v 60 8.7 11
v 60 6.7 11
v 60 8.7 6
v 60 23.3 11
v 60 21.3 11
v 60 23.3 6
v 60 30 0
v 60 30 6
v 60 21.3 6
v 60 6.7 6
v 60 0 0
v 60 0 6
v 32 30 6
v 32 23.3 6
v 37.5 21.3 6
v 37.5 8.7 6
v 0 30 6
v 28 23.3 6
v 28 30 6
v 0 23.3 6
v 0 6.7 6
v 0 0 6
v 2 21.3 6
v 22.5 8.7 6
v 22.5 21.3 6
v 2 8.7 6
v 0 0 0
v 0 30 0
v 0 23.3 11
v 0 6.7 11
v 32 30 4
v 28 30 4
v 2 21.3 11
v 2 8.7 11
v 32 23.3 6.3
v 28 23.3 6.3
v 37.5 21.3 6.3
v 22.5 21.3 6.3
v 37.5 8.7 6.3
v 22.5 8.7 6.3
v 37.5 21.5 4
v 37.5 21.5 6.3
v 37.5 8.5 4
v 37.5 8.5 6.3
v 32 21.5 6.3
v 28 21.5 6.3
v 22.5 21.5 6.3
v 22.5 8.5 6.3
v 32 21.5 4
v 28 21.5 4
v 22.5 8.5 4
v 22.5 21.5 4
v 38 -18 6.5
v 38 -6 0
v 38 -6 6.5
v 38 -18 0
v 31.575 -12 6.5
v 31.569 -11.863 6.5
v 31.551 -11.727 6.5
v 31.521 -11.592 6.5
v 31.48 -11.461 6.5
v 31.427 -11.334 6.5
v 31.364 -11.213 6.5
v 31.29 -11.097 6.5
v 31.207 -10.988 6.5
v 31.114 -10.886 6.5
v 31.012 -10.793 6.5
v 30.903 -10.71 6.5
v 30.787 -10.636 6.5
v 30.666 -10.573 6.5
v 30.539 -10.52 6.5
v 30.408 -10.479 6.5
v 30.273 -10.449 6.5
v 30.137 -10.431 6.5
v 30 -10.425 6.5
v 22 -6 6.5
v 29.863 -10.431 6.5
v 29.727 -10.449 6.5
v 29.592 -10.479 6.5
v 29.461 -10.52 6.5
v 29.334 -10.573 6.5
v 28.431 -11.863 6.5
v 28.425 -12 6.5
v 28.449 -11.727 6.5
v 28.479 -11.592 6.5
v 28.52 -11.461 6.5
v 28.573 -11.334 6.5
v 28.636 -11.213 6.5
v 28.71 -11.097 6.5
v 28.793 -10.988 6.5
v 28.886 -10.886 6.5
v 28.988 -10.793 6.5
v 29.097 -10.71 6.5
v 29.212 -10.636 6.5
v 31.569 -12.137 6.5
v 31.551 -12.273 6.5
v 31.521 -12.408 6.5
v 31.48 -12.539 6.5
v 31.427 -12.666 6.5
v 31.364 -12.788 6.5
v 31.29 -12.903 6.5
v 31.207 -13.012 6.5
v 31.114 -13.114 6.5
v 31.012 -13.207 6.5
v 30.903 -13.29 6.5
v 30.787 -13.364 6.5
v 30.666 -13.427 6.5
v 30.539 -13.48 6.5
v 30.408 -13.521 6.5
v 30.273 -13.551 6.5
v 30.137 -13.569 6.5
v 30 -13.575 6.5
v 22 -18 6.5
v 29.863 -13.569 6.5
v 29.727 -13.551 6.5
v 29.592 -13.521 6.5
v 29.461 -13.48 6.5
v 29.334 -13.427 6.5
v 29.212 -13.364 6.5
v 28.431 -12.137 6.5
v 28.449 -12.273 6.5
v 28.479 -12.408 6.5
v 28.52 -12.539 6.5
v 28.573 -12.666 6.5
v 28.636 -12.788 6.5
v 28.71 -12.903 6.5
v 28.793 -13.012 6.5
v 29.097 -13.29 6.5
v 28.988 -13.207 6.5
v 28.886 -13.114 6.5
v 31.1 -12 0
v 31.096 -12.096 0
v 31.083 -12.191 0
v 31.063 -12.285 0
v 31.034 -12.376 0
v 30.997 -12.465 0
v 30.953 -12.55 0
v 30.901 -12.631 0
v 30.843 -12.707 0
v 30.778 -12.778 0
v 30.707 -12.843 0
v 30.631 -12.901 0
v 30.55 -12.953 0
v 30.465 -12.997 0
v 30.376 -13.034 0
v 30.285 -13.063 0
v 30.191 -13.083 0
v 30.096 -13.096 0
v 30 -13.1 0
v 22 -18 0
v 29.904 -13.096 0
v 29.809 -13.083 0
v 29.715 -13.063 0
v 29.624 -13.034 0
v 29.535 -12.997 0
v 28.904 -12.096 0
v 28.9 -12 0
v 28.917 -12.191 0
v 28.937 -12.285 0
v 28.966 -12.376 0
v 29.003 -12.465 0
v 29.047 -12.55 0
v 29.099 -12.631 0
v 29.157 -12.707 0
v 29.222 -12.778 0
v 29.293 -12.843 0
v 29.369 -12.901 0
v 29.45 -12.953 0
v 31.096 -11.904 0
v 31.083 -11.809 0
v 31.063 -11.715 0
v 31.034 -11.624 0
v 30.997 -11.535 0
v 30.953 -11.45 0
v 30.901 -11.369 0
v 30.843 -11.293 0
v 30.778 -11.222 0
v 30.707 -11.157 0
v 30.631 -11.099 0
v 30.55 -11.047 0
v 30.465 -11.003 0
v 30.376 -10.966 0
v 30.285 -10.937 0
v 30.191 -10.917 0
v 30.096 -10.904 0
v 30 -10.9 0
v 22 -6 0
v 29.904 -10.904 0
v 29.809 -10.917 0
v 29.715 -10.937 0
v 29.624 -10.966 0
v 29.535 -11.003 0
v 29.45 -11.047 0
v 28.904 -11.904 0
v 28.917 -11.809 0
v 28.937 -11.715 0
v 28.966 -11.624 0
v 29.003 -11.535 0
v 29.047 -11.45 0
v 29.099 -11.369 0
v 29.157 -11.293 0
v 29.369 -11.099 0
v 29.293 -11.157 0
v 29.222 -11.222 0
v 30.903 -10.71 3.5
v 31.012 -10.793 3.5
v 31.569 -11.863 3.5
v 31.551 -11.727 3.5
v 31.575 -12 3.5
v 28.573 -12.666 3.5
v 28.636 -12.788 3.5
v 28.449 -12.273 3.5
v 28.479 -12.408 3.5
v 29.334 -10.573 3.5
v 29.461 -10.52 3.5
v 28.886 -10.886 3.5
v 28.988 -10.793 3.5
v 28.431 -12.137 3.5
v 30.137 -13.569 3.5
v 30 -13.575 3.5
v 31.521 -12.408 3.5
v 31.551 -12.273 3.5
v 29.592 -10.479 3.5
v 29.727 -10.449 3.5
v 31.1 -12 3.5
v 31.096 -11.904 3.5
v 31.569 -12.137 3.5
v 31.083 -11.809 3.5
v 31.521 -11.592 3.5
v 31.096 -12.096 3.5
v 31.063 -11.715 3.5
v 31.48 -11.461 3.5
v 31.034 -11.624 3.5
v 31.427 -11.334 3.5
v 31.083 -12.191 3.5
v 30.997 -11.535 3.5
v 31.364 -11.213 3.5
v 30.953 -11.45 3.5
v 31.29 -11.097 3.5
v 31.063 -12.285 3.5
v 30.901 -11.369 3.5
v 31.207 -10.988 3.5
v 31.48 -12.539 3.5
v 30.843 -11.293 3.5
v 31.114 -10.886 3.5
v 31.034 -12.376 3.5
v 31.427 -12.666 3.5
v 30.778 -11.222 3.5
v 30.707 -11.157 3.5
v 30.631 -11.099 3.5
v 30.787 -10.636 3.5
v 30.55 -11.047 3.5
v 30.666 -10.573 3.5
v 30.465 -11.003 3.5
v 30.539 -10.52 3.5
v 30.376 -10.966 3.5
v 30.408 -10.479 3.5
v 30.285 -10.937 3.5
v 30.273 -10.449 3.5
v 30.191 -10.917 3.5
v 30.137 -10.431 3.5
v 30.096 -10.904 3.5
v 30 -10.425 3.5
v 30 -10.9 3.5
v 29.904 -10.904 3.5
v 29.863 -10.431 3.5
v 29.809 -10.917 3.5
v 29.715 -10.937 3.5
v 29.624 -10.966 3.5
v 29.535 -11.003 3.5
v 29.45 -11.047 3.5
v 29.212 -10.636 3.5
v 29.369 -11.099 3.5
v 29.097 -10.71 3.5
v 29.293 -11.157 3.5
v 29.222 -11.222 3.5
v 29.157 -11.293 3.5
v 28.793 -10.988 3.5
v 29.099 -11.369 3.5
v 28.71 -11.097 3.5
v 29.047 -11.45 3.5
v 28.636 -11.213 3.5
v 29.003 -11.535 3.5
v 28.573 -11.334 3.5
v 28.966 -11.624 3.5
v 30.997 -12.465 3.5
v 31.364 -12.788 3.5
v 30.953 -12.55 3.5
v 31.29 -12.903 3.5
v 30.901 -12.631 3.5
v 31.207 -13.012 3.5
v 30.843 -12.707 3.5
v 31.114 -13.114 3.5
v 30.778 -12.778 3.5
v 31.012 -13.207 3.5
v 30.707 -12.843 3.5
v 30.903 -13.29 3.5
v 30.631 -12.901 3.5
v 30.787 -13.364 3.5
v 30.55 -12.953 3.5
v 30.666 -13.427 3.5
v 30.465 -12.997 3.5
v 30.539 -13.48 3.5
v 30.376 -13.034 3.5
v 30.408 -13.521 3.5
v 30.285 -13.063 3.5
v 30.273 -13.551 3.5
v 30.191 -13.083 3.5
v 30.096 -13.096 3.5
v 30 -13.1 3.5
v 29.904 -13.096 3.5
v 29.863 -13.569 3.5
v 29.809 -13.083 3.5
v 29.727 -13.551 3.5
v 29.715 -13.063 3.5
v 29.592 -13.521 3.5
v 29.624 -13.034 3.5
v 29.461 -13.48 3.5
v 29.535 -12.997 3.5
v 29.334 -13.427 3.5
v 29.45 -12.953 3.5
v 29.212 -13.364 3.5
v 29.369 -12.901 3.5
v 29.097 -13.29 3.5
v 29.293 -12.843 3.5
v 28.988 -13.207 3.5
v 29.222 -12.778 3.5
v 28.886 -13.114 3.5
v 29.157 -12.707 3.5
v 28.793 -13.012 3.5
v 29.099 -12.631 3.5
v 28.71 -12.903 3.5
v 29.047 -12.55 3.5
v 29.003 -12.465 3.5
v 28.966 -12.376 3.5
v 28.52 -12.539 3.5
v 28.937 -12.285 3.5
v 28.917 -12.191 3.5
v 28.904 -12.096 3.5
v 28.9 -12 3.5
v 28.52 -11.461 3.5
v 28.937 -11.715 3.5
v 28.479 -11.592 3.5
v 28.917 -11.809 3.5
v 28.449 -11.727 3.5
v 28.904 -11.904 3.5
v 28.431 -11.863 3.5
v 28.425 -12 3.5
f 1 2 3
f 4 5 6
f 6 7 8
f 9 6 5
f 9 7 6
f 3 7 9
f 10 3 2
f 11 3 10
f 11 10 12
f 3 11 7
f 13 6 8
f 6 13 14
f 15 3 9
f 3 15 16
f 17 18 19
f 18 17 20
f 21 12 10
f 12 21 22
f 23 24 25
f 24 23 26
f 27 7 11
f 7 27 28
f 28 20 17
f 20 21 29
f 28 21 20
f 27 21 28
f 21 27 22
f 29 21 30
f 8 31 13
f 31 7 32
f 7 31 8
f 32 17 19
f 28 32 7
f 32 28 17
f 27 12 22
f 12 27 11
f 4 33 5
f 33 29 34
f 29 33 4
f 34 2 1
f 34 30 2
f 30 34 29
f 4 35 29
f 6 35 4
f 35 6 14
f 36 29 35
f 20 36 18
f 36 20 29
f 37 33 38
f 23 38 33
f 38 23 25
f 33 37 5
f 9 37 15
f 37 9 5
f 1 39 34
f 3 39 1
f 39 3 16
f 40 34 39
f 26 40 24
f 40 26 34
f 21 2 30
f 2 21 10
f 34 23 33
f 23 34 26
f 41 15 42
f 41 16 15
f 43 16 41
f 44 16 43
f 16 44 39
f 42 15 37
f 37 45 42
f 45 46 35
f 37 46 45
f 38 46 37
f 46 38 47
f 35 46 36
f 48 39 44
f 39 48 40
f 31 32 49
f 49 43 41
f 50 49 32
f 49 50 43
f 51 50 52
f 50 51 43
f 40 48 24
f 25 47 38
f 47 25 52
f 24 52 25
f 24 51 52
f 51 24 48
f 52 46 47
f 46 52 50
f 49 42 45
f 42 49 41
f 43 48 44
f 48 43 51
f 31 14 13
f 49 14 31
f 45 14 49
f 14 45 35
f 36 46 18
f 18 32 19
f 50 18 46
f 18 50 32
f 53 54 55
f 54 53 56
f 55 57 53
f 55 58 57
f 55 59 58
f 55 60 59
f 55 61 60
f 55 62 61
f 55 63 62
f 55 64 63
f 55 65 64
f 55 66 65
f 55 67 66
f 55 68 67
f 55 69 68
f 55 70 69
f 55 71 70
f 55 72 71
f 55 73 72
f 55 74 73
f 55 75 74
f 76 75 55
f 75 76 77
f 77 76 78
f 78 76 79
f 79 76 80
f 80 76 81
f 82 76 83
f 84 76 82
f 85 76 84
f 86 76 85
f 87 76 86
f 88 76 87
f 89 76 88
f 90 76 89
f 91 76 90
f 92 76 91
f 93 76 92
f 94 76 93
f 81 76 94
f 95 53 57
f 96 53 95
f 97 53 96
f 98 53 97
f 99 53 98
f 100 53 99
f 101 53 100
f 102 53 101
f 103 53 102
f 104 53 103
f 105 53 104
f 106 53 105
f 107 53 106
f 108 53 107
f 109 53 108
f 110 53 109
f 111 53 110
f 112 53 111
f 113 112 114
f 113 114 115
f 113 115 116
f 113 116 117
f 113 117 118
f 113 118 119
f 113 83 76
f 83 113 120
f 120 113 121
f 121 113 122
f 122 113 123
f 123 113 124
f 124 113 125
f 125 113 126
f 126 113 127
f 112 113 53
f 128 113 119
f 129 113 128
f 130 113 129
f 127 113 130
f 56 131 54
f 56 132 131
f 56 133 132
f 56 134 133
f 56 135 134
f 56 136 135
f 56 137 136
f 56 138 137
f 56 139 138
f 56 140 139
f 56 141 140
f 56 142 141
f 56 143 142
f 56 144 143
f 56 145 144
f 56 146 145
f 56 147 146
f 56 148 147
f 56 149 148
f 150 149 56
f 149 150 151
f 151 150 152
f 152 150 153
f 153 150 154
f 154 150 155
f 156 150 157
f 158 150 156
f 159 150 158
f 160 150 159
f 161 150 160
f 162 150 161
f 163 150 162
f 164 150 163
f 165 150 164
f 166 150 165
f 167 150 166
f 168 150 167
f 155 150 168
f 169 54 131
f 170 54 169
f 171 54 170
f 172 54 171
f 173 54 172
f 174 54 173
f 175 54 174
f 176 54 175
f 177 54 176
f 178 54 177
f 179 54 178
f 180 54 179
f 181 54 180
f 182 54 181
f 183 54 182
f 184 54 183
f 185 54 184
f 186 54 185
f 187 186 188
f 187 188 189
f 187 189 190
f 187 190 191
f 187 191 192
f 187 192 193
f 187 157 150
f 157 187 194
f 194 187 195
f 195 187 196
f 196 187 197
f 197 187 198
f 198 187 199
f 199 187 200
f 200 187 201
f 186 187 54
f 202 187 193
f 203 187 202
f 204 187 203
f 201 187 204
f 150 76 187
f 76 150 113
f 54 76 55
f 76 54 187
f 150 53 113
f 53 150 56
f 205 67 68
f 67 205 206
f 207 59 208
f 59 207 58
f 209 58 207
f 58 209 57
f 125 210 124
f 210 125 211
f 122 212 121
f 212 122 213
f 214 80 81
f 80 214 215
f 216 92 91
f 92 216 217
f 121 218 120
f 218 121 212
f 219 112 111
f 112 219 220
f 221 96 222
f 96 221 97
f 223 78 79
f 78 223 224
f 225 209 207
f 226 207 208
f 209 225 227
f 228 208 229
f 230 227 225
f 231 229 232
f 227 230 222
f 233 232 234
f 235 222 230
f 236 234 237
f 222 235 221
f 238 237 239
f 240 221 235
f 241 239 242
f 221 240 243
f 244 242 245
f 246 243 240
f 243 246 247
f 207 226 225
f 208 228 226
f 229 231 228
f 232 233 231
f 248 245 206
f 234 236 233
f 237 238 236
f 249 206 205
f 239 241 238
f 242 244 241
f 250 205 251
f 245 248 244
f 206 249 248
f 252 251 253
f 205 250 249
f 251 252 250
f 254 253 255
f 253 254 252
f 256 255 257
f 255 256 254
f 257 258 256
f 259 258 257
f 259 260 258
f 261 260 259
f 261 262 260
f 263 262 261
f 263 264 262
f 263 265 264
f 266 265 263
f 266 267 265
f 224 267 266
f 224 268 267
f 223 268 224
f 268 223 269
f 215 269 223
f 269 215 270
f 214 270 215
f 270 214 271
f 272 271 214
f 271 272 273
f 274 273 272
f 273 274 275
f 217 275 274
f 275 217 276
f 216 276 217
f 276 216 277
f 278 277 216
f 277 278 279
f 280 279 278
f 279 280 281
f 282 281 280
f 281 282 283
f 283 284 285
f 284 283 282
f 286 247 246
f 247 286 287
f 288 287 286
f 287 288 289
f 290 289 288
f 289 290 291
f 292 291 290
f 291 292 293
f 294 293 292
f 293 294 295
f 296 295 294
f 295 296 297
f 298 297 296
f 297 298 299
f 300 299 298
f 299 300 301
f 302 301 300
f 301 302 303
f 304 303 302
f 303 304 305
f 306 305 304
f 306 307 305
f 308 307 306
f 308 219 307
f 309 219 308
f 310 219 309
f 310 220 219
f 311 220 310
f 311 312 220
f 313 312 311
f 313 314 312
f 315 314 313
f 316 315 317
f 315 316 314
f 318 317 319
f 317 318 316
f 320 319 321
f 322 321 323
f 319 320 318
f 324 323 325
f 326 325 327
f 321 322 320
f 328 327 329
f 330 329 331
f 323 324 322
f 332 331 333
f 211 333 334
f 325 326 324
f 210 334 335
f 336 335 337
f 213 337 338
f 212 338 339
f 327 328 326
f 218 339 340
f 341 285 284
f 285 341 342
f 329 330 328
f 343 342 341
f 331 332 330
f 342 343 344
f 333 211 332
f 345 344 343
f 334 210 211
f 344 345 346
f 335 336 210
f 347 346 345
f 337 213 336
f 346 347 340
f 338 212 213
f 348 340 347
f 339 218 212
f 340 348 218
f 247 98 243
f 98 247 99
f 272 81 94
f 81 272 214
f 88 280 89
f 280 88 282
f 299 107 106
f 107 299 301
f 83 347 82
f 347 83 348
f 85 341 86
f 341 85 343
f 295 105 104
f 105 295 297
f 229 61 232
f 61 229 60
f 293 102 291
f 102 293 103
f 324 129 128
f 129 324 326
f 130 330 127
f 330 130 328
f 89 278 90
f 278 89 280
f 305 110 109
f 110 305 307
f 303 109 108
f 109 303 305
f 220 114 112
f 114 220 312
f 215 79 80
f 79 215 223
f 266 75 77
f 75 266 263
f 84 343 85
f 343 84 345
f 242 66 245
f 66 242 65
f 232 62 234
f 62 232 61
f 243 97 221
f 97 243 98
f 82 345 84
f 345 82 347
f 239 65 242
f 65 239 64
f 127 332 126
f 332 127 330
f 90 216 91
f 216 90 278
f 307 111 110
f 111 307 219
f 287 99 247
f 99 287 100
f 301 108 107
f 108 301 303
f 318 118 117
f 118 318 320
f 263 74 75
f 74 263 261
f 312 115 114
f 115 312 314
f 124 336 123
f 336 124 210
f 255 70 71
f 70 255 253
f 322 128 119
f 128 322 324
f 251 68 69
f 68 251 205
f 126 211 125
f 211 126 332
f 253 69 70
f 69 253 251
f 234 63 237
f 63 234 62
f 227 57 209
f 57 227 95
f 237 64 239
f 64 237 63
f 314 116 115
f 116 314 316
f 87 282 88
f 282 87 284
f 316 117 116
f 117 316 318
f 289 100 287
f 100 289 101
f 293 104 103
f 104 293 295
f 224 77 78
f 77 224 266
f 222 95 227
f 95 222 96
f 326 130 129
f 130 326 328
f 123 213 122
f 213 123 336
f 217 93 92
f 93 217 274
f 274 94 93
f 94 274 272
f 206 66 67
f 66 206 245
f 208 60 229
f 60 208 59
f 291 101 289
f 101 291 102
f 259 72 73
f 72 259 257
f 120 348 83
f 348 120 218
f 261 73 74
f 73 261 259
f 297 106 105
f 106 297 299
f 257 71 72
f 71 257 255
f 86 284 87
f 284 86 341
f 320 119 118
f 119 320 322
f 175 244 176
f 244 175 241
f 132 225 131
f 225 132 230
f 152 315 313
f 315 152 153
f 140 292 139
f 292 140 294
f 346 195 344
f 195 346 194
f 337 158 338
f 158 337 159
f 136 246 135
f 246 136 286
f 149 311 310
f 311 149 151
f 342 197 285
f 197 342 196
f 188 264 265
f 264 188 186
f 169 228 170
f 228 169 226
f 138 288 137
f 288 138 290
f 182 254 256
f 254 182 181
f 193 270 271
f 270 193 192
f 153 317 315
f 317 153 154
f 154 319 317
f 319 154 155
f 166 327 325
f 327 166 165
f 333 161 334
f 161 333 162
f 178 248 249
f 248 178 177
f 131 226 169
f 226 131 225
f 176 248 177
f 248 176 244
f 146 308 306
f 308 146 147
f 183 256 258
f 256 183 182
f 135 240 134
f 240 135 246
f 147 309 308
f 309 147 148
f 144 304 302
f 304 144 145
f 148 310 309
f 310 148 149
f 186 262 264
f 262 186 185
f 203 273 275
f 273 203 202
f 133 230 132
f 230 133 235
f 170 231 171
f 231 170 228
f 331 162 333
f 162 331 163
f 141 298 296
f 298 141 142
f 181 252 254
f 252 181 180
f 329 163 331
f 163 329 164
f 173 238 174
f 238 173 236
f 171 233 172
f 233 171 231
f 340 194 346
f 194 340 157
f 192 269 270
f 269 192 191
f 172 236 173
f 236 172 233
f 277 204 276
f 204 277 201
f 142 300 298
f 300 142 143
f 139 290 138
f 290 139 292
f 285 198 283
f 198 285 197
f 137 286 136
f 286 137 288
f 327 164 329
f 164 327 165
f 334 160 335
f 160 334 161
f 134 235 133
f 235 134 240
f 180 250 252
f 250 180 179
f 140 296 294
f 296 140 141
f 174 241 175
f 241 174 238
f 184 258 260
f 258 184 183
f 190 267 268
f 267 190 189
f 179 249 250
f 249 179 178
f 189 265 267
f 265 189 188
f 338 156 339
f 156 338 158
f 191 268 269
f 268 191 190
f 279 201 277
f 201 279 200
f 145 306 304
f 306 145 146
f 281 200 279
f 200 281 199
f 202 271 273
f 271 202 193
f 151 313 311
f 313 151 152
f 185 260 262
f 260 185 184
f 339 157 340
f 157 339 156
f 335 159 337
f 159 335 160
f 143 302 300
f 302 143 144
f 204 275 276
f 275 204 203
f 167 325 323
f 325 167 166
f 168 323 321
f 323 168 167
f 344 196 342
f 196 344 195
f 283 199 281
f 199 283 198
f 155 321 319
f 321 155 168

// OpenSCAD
// ExoKey field-map fixture -- COUPON.md tests T1 (plunge) / T3 (lateral).
// Fix the Hall, slide the magnet over it in X (a caliper sets X), hold the gap; log (Bx,By,Bz).
// Export one part at a time:  openscad -D 'part="base"'  /  -D 'part="sled"'
part = "both";          // "base" | "sled" | "both"

gap     = 3.5;          // magnet face -> Hall chip (mm). VERIFY with a feeler gauge, tune to your board.
hall_l  = 15;           // Hall breakout pocket L,W,depth -- SET to your breakout.
hall_w  = 13;
hall_d  = 2.0;
mag_d   = 3.0;          // magnet diameter
mag_t   = 1.0;          // magnet thickness
sled_w  = 12;
sled_l  = 16;
sled_h  = gap + mag_t + 2;
wall    = 2;
clr     = 0.3;
railz   = 5;
base_l  = 60; base_w = 30; base_h = 6;
chan_w  = sled_w + 2*clr;
$fn = 72;

module hall_base() {
  difference() {
    union() {
      cube([base_l, base_w, base_h]);
      translate([0, base_w/2 + chan_w/2,        base_h]) cube([base_l, wall, railz]);  // +y guide rail
      translate([0, base_w/2 - chan_w/2 - wall, base_h]) cube([base_l, wall, railz]);  // -y guide rail
      translate([0, base_w/2 - chan_w/2 - wall, base_h]) cube([wall, chan_w + 2*wall, railz]); // x=0 datum stop
    }
    translate([base_l/2 - hall_l/2, base_w/2 - hall_w/2, base_h - hall_d])
      cube([hall_l, hall_w, hall_d + 0.3]);                                            // Hall pocket
    translate([base_l/2 - 2, base_w/2 + hall_w/2, base_h - hall_d])
      cube([4, base_w/2, hall_d + 0.3]);                                               // wire slot out +y
  }
}

module magnet_sled() {
  difference() {
    cube([sled_l, sled_w, sled_h]);
    translate([sled_l/2, sled_w/2, gap])  cylinder(h = sled_h, d = mag_d + 0.15);      // magnet slot (top-load, rests at z=gap)
    translate([sled_l/2, sled_w/2, -0.1]) cylinder(h = gap + 0.2, d = mag_d - 0.8);    // window to the Hall
  }
}

if (part == "base" || part == "both") hall_base();
if (part == "sled" || part == "both") translate([base_l/2 - sled_l/2, -sled_w - 6, 0]) magnet_sled();
